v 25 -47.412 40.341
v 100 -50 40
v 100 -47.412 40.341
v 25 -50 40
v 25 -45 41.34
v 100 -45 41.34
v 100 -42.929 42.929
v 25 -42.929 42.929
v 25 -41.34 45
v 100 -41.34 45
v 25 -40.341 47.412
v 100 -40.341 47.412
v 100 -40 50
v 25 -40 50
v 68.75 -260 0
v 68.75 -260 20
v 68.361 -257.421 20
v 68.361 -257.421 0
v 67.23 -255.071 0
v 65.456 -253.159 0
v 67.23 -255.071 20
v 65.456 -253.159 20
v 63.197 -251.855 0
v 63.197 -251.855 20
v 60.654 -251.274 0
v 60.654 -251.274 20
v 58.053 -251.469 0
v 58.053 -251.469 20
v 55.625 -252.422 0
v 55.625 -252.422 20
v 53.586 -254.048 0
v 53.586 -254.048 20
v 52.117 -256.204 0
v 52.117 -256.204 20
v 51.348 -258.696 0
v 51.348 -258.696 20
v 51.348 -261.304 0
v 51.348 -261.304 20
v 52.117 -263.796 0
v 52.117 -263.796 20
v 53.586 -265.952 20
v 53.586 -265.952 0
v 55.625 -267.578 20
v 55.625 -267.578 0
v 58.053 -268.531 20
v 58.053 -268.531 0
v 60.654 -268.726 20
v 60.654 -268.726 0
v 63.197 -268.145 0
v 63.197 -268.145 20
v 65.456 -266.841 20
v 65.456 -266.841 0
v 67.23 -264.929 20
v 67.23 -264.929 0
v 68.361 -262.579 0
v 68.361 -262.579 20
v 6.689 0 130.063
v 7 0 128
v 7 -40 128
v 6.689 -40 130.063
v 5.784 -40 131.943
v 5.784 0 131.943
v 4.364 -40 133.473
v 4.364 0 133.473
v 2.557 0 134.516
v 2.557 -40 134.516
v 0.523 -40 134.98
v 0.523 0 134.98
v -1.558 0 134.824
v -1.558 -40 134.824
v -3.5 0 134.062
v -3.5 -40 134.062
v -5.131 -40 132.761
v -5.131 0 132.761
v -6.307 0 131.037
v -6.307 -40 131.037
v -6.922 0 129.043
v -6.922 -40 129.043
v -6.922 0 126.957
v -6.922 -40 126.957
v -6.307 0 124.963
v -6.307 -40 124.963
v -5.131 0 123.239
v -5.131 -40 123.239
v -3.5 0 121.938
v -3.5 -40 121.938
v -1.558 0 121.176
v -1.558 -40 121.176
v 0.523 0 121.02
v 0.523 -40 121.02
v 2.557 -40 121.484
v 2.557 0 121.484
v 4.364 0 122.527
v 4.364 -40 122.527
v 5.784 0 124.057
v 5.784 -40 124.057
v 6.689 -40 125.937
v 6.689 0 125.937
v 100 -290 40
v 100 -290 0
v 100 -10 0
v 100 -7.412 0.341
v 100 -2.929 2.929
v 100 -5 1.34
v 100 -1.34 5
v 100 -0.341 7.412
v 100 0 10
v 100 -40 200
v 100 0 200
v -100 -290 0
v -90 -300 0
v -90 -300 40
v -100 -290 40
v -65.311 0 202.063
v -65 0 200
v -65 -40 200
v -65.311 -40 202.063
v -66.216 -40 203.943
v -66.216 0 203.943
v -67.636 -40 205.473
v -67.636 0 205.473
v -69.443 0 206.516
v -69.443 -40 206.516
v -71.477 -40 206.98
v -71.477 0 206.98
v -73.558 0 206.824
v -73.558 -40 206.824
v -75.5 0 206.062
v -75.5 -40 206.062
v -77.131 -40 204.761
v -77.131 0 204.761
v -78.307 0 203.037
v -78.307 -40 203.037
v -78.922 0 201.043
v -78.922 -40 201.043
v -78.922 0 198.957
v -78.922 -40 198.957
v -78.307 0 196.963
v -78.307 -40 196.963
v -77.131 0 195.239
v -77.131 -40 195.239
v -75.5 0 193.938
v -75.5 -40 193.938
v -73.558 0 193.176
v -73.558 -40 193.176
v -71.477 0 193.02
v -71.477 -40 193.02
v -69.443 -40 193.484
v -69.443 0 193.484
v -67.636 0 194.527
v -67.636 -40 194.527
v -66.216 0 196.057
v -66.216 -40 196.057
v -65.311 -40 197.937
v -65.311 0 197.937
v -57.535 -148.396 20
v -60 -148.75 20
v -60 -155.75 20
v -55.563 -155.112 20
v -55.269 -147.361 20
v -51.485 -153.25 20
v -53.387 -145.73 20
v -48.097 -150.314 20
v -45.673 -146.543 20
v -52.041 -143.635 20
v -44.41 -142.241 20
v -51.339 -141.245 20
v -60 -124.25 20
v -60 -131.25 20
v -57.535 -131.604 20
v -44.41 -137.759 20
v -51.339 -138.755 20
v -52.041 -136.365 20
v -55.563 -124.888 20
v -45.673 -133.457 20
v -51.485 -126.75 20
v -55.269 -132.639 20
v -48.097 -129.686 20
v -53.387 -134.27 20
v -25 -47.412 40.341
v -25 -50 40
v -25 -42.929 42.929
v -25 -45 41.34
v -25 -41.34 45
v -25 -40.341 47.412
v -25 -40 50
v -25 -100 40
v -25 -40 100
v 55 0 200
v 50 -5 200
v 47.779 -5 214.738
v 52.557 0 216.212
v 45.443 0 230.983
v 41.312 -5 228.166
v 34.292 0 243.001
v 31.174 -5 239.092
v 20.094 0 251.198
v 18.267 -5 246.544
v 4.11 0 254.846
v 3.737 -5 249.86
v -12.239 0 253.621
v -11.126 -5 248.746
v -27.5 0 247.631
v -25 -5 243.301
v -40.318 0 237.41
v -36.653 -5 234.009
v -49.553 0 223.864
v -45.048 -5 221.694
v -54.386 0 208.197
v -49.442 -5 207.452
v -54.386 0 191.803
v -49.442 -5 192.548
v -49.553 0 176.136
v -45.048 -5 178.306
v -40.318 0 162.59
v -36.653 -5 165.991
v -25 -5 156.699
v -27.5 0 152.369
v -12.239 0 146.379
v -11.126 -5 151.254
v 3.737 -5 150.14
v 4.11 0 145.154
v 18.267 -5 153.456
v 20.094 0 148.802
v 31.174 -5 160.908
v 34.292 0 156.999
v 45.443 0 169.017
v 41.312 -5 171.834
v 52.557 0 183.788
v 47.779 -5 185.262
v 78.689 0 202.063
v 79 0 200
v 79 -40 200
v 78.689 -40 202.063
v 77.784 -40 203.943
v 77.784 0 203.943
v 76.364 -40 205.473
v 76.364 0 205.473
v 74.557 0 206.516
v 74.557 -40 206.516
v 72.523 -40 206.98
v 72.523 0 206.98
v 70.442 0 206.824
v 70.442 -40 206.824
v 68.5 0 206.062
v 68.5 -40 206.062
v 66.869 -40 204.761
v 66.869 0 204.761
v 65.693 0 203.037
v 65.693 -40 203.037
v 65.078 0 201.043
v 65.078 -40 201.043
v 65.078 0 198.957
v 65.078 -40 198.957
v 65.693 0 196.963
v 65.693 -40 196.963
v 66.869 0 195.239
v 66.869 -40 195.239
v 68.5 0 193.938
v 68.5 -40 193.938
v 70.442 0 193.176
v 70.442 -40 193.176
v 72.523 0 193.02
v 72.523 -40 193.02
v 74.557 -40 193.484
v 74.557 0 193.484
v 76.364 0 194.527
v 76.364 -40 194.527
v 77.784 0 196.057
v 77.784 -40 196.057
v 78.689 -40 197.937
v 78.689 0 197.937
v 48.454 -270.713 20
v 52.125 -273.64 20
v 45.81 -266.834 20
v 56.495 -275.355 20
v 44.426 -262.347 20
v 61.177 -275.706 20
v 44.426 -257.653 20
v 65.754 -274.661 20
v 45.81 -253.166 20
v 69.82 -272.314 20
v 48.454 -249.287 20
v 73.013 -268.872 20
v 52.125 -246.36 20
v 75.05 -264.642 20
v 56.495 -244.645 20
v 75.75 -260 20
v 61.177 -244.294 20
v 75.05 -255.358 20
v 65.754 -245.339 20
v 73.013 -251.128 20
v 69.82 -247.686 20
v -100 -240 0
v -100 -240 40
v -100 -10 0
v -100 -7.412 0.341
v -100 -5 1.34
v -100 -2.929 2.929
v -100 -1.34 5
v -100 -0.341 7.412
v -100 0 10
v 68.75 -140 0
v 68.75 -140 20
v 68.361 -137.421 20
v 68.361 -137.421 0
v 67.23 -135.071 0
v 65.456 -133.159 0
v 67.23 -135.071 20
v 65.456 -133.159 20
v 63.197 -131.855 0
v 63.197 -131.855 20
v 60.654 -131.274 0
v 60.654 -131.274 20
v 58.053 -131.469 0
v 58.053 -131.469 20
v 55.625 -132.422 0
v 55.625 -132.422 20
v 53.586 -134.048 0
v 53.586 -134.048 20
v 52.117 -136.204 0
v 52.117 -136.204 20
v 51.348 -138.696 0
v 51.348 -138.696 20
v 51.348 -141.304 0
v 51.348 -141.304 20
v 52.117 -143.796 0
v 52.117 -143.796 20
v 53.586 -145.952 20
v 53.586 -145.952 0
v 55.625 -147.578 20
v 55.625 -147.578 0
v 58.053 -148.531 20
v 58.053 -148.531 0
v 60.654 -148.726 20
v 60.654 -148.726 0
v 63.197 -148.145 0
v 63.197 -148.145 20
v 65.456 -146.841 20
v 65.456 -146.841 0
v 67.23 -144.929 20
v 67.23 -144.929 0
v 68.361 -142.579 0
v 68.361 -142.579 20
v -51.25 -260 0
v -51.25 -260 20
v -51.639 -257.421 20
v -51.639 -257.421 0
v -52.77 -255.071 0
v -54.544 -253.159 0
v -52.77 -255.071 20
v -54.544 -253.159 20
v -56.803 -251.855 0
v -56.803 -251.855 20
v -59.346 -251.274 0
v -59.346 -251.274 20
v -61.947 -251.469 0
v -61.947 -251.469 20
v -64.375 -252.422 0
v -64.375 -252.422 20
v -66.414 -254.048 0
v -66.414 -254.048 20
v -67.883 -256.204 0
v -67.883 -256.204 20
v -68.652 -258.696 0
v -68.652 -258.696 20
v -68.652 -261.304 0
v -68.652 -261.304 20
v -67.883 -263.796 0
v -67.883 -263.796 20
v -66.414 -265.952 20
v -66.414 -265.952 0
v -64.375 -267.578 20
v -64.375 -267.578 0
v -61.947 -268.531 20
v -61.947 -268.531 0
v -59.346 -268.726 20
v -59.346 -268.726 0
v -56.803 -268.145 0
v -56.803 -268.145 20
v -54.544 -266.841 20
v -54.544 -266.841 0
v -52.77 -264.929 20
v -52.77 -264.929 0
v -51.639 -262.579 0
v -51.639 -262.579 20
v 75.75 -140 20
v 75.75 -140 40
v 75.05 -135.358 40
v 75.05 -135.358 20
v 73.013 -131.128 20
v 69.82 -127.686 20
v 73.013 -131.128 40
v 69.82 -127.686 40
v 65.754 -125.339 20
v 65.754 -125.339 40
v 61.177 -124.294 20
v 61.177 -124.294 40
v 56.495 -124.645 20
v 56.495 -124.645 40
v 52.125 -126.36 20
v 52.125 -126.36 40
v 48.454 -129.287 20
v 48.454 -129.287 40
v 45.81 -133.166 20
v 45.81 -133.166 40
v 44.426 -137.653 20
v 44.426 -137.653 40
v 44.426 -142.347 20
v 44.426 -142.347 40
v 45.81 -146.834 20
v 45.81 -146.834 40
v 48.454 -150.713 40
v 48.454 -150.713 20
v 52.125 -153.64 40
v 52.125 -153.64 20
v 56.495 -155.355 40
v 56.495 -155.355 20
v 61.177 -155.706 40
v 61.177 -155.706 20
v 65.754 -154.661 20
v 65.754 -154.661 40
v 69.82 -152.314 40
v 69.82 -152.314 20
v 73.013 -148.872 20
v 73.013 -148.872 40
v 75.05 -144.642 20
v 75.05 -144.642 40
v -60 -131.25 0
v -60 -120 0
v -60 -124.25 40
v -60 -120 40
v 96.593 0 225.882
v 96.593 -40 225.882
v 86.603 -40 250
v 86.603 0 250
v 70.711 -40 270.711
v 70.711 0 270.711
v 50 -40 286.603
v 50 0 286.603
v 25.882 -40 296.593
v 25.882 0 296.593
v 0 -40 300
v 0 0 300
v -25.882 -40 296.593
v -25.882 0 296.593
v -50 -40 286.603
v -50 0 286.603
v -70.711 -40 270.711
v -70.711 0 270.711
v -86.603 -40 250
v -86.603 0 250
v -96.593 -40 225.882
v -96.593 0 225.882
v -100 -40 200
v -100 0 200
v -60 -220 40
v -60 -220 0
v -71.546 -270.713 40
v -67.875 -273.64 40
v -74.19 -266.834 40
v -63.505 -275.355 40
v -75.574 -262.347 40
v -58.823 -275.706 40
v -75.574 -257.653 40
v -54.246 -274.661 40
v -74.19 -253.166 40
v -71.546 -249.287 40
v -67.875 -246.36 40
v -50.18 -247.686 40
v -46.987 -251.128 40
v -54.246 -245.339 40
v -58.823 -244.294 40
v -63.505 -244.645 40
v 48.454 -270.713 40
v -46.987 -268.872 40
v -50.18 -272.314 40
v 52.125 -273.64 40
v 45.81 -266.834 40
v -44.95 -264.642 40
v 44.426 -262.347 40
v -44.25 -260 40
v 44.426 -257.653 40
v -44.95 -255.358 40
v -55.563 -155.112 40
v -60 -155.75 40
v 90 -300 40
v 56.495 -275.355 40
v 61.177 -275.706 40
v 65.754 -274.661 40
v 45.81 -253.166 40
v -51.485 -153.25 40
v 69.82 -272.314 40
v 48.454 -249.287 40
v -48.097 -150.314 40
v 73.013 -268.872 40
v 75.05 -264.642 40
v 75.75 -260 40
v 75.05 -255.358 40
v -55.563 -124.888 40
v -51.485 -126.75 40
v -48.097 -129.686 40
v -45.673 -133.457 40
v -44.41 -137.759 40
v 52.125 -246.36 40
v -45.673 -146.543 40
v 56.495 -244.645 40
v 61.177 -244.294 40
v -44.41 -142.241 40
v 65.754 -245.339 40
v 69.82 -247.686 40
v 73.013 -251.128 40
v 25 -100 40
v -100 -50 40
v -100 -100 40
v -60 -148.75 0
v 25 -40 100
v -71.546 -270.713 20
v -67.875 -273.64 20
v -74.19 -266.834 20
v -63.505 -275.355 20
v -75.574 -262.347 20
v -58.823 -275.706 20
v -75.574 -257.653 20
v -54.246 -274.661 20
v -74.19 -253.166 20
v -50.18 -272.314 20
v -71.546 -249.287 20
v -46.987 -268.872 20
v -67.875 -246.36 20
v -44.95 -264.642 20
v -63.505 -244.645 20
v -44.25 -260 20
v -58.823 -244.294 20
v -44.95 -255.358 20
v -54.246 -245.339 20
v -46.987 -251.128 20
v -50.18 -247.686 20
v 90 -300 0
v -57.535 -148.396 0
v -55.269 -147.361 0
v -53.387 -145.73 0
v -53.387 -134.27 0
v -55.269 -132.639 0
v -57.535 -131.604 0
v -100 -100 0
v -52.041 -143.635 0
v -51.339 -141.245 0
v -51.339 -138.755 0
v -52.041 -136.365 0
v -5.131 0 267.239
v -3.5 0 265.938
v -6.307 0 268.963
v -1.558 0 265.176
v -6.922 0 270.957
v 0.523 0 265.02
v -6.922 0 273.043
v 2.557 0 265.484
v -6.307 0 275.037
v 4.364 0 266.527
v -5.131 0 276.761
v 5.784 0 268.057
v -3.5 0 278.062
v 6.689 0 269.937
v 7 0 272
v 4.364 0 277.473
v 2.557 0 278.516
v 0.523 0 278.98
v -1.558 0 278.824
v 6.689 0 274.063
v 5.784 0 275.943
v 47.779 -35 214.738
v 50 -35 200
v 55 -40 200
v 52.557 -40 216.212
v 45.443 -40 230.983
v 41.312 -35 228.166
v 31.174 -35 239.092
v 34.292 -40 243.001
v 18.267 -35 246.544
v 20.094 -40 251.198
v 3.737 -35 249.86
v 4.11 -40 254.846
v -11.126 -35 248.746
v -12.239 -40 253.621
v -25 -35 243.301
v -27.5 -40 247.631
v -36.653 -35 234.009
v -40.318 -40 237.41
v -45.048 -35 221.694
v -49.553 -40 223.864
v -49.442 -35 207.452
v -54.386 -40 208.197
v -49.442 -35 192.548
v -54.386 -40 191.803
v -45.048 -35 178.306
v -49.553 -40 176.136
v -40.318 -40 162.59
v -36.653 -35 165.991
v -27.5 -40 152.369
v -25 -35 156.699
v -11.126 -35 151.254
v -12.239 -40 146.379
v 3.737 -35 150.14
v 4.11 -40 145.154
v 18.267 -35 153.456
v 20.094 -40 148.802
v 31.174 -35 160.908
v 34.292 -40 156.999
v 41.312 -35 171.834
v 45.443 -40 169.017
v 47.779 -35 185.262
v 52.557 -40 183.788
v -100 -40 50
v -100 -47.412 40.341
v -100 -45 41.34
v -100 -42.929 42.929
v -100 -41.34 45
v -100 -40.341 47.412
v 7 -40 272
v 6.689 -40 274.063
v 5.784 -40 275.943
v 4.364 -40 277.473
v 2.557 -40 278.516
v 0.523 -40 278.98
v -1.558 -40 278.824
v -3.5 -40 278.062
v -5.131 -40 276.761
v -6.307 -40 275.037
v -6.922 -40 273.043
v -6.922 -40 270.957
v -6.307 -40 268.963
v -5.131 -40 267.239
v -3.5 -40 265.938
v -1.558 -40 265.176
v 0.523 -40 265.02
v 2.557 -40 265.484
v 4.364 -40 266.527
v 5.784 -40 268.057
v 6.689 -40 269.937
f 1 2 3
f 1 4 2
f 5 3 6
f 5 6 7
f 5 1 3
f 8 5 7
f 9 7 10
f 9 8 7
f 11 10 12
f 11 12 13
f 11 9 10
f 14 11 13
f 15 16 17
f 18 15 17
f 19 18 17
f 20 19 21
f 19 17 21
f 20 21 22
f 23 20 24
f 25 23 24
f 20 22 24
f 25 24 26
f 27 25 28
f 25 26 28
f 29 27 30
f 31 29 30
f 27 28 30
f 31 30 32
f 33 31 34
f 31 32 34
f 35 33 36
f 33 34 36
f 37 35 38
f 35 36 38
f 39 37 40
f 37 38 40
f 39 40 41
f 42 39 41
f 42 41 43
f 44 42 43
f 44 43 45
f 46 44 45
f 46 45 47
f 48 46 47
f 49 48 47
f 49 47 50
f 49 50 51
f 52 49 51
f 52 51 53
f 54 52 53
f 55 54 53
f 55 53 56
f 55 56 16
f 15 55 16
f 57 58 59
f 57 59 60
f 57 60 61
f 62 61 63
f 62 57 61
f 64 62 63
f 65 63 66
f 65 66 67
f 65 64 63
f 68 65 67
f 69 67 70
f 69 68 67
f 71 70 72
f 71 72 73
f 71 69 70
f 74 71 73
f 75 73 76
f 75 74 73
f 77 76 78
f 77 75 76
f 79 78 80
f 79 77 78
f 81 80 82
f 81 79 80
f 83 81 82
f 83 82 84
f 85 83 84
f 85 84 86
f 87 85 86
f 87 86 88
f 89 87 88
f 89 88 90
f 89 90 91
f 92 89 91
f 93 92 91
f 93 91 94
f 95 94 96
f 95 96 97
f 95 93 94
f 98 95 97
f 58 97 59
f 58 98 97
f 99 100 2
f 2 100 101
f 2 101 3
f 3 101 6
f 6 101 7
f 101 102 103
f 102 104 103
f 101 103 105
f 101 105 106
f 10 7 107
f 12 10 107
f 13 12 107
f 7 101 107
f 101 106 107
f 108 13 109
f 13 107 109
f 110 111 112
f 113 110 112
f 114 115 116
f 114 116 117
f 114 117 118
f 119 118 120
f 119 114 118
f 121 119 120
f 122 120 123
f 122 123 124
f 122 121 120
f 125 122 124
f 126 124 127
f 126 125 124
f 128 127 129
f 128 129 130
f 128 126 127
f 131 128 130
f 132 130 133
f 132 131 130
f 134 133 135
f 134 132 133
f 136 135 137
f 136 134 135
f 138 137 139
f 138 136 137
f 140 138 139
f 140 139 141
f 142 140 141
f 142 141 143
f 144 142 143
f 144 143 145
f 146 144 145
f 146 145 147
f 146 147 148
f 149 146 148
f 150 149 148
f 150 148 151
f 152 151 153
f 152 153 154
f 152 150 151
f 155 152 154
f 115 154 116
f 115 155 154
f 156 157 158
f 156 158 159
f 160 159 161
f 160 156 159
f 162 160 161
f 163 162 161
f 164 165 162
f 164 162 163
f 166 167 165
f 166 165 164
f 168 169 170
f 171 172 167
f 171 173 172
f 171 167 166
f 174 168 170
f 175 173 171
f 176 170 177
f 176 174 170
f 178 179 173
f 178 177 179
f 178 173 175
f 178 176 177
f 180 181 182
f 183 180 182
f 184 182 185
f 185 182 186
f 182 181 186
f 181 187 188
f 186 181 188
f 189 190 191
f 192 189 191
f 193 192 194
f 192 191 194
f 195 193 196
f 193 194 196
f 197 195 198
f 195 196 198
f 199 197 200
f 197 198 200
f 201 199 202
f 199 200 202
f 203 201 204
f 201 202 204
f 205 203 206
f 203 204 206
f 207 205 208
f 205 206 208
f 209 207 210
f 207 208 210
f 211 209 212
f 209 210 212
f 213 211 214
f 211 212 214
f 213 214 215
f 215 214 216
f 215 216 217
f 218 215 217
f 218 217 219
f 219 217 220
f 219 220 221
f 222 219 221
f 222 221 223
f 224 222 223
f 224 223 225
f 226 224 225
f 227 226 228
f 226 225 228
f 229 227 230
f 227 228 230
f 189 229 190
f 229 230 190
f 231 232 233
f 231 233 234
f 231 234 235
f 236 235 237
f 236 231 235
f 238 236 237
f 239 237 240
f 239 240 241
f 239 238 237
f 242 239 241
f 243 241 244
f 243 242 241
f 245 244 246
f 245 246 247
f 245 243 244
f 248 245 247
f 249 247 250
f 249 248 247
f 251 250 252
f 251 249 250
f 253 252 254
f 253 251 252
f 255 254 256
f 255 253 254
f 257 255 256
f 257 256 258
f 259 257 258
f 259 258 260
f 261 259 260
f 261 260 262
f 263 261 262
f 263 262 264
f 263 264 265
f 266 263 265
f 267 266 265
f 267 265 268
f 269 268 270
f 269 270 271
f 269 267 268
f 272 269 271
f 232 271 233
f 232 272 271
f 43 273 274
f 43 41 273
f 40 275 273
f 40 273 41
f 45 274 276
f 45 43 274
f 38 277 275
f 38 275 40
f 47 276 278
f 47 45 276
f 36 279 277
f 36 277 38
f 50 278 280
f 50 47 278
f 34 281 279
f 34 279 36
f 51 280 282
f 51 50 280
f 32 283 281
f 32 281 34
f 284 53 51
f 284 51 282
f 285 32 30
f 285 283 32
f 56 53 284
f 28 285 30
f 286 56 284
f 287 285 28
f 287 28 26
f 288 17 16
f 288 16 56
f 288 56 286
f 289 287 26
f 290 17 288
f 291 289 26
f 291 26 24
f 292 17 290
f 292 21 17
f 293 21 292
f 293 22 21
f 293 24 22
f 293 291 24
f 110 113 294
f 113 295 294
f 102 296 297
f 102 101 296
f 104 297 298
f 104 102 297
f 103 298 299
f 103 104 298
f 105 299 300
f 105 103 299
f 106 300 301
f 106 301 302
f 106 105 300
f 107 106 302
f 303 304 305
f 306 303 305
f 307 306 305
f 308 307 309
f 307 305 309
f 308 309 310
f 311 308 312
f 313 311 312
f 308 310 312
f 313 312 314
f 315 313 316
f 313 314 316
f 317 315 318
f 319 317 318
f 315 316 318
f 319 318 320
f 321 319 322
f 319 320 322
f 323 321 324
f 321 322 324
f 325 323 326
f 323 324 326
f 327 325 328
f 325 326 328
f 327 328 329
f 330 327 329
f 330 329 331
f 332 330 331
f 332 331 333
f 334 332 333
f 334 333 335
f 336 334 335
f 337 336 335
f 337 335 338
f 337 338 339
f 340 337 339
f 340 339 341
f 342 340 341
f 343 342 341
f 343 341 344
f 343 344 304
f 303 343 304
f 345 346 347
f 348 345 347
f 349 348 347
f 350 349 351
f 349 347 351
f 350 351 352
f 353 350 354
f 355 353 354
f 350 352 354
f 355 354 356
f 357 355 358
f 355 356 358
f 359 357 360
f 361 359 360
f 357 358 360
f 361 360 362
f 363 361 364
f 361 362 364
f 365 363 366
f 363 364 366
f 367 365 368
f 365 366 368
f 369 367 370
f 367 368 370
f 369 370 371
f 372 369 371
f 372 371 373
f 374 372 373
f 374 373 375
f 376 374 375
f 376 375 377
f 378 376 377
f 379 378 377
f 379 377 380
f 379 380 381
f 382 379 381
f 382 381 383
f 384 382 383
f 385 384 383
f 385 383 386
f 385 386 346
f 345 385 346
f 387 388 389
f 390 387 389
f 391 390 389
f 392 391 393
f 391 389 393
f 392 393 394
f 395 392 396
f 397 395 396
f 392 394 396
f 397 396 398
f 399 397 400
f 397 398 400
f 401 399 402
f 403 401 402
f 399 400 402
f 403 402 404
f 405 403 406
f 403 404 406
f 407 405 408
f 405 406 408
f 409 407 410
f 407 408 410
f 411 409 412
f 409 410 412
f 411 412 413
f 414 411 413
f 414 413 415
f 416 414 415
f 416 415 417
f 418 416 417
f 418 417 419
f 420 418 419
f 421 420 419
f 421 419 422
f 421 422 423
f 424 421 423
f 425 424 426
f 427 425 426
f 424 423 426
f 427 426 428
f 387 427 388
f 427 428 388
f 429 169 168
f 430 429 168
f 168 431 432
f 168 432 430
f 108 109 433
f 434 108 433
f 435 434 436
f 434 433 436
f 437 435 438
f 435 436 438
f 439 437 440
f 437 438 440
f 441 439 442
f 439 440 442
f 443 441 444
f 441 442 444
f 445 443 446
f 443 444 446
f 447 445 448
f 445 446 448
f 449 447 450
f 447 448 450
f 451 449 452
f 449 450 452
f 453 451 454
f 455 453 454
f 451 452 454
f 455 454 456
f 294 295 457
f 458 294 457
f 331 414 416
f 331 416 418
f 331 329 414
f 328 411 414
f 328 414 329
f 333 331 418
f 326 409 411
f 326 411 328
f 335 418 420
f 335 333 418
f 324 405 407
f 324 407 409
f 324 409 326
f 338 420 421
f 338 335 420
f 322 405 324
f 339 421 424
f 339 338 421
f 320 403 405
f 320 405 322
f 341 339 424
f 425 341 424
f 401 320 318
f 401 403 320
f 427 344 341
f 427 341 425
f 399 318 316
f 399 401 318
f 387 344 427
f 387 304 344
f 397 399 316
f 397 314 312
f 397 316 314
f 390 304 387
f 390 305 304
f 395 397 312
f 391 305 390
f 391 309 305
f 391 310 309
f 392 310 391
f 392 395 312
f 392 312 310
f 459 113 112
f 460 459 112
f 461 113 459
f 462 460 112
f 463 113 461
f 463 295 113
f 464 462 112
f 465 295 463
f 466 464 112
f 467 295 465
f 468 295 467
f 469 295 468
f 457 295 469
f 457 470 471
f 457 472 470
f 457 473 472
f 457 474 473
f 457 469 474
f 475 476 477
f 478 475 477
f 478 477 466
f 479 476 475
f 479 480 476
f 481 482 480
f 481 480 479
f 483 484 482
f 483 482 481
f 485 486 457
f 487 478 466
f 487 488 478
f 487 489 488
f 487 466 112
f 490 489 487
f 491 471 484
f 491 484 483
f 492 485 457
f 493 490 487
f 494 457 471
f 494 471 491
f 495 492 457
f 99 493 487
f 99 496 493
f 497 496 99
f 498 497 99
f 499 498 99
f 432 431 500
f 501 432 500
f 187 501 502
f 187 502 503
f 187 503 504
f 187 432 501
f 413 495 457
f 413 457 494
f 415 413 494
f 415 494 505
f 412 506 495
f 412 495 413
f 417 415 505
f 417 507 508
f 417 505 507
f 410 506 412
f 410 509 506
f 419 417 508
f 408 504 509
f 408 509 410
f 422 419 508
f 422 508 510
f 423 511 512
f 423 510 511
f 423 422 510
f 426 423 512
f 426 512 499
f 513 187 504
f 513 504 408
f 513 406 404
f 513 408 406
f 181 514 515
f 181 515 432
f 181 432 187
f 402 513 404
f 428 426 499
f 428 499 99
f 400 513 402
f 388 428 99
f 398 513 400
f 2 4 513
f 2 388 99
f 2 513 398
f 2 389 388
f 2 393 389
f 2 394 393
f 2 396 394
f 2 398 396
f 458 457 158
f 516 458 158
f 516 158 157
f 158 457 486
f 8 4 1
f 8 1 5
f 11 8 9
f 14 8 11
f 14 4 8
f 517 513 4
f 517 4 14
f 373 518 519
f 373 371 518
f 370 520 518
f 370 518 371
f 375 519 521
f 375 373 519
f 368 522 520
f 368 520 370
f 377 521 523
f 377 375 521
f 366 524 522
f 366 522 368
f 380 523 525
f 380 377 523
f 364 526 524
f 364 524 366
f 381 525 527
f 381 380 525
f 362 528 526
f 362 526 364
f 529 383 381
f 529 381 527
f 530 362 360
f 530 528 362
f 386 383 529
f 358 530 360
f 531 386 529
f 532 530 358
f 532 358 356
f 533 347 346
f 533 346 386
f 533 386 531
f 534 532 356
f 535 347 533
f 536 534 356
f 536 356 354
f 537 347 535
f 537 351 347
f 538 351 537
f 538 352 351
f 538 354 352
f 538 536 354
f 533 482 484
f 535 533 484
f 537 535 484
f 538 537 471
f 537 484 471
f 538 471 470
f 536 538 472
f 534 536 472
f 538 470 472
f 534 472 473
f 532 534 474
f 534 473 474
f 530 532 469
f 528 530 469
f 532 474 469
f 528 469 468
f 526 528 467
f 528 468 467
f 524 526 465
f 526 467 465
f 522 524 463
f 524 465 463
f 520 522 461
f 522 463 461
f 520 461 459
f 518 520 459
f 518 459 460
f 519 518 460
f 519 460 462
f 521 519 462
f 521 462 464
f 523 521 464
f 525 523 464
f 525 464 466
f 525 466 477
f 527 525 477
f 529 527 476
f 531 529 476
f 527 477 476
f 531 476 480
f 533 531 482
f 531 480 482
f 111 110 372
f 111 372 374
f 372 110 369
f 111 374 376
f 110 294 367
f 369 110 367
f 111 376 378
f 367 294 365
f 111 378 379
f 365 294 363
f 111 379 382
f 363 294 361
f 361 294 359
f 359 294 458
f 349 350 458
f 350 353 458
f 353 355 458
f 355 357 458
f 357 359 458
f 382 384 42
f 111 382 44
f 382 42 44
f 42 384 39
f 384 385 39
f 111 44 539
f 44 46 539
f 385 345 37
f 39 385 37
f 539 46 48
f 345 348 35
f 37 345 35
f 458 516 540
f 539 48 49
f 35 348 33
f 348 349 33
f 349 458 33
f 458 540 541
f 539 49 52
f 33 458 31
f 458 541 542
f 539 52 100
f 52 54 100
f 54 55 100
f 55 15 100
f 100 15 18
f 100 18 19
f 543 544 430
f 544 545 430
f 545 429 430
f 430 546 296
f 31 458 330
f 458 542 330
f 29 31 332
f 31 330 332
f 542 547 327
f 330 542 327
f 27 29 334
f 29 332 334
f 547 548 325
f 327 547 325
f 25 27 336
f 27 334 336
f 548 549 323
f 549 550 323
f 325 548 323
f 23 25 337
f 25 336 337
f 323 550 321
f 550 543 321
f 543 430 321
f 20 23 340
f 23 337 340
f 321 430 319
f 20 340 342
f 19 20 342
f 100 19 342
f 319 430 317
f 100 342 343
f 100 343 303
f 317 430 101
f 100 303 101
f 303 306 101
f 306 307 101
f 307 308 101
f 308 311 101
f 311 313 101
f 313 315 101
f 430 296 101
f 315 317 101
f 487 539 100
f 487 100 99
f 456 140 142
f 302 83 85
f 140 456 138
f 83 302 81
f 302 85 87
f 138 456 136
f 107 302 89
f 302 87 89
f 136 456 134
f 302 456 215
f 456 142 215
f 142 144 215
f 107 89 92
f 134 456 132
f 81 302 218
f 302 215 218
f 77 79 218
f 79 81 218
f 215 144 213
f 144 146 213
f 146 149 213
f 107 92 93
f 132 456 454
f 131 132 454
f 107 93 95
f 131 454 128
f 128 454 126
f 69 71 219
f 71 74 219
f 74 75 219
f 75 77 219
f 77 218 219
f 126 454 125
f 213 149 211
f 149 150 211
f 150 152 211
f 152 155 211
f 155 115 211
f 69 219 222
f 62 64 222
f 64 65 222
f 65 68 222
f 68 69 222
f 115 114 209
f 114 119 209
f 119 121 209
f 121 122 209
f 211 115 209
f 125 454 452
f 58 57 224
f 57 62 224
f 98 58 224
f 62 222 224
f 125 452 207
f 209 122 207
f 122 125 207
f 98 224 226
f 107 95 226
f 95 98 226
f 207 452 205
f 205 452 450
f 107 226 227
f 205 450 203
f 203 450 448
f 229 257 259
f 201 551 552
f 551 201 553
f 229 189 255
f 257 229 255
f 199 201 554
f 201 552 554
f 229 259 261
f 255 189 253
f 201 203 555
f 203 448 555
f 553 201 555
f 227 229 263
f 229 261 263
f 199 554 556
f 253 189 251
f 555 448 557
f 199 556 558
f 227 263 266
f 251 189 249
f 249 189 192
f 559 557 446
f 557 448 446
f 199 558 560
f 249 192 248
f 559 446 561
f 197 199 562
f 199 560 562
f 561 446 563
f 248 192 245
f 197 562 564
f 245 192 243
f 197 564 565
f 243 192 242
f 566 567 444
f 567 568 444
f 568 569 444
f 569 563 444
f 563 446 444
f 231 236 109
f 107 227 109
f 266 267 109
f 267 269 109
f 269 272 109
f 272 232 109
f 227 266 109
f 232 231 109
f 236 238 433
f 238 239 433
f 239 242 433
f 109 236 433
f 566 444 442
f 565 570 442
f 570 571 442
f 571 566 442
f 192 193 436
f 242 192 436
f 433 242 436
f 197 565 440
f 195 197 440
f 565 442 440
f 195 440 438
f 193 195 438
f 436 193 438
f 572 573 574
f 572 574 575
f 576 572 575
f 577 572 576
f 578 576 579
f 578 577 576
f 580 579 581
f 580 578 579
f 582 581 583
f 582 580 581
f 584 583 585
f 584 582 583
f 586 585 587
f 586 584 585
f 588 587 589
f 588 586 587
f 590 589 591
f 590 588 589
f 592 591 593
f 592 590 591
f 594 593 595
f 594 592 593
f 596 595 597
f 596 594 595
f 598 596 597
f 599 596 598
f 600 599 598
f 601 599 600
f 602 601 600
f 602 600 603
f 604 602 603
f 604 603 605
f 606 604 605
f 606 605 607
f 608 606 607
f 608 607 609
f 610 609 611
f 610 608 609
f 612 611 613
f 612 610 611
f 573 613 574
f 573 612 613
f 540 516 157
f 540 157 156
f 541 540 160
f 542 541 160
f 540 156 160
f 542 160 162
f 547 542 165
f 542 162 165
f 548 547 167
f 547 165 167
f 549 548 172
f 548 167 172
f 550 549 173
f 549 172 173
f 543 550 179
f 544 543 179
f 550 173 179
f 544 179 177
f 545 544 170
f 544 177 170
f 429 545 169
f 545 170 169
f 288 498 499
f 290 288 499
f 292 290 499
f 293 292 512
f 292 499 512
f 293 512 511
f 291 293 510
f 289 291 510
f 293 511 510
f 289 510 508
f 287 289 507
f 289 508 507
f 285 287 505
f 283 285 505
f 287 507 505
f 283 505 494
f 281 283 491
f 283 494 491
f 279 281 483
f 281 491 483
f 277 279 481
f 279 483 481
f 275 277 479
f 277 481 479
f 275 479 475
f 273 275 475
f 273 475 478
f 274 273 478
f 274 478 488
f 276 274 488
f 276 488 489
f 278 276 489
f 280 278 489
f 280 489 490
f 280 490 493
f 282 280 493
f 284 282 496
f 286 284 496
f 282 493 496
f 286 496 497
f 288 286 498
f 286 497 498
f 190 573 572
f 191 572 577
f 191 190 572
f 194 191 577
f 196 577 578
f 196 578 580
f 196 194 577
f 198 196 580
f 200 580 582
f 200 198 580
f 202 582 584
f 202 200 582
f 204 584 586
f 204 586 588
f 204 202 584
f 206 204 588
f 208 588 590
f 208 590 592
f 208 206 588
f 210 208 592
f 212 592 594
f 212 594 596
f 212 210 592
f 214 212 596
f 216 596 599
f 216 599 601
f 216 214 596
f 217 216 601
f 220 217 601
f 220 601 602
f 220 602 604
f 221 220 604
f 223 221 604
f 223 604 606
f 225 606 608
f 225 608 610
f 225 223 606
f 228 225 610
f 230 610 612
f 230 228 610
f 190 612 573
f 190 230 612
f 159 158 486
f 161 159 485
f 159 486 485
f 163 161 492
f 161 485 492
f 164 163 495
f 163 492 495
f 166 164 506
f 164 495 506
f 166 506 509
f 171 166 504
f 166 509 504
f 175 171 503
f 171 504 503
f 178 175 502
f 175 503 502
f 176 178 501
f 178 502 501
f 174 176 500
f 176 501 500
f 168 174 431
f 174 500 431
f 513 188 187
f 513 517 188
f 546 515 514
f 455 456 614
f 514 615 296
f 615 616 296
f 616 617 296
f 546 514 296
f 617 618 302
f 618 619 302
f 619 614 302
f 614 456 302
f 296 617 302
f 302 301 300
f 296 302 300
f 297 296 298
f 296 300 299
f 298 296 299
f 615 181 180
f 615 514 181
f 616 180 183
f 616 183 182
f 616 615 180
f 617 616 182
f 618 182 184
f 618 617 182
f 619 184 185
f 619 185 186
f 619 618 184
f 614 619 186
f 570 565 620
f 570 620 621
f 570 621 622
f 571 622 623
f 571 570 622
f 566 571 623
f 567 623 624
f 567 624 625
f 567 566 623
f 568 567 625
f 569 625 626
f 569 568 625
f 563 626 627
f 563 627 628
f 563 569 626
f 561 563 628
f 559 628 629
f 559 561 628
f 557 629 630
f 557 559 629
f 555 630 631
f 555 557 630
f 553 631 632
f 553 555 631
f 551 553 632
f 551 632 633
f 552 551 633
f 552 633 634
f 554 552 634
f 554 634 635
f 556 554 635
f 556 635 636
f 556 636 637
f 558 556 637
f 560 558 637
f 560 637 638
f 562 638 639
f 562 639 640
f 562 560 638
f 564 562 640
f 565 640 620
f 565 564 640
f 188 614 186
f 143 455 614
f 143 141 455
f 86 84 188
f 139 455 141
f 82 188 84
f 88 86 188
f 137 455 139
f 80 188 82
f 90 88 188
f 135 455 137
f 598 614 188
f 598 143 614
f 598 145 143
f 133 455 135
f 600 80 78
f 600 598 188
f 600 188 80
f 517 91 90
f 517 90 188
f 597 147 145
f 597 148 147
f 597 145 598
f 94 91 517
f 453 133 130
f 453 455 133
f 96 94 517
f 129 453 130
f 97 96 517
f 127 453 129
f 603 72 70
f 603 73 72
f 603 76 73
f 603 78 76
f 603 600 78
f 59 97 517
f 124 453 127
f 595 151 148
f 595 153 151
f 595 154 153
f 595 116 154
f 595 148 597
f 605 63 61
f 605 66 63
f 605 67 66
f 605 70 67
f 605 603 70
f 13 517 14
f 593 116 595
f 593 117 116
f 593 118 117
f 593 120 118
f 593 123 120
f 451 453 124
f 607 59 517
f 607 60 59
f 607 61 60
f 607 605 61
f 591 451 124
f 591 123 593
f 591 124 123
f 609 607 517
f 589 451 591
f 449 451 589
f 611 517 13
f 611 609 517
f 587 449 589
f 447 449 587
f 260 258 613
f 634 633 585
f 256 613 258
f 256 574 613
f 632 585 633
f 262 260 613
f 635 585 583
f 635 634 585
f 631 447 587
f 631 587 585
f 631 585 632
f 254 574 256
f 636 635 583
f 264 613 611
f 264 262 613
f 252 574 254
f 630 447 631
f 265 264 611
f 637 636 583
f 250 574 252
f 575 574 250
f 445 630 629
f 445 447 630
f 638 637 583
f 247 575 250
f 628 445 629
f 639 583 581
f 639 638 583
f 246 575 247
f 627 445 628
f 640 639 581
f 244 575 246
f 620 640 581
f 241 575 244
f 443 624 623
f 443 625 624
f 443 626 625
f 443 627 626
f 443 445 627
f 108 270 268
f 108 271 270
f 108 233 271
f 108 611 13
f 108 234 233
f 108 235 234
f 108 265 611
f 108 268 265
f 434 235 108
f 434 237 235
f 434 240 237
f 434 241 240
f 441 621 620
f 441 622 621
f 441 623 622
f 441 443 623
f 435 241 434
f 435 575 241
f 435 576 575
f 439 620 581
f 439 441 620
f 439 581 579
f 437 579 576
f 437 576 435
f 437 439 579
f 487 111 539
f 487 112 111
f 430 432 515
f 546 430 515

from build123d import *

# Parameters (mm, degrees)
F0_W      = 200
F0_H      = 40
F0_R      = 7
F0_R_2    = 50
F1_DEPTH  = 40
F2_DEPTH  = 300
F3_SIZE   = 5
F4_R      = 8.75
F5_DEPTH  = 40.001
F4_R_2    = 15.75
F6_DEPTH  = 20
F7_SIZE   = 10
F8_R      = 10
F10_DEPTH = 25
F13_DEPTH = 40.001
F14_R     = 10


with BuildPart() as f1:
    # F0 (on Front) → F1 (new body)
    with BuildSketch(Plane.XZ):
        with Locations((0, 20)):
            Rectangle(F0_W, F0_H)
        with BuildLine():
            Line((-100, 200), (-100, 40))
            Line((-100, 40), (100, 40))
            Line((100, 40), (100, 200))
            ThreePointArc((100, 200), (0, 300), (-100, 200))
        make_face()
        with Locations((0, 128)):
            Circle(F0_R, mode=Mode.SUBTRACT)
        with Locations((-72, 200)):
            Circle(F0_R, mode=Mode.SUBTRACT)
        with Locations((0, 200)):
            Circle(F0_R_2, mode=Mode.SUBTRACT)
        with Locations((72, 200)):
            Circle(F0_R, mode=Mode.SUBTRACT)
        with Locations((0, 272)):
            Circle(F0_R, mode=Mode.SUBTRACT)
    extrude(amount=F1_DEPTH)

    # F0 (on Front) → F2 (join)
    with BuildSketch(Plane.XZ):
        with Locations((0, 20)):
            Rectangle(F0_W, F0_H)
    extrude(amount=F2_DEPTH)

    # F3
    f3_edges = [f1.edges().sort_by_distance(p)[0] for p in [
        (-50, -40, 200),
        (-50, 0, 200),
    ]]
    chamfer(f3_edges, length=F3_SIZE)

    # F4 (on face) → F5 (cut, through all)
    with BuildSketch(Plane.XY.offset(40)):
        with Locations((60, -140)):
            Circle(F4_R)
        with Locations((-60, -140)):
            Circle(F4_R)
        with Locations((60, -260)):
            Circle(F4_R)
        with Locations((-60, -260)):
            Circle(F4_R)
    extrude(amount=-F5_DEPTH, mode=Mode.SUBTRACT)

    # F4 (on face) → F6 (cut)
    with BuildSketch(Plane.XY.offset(40)):
        with Locations((-60, -140)):
            Circle(F4_R_2)
        with Locations((-60, -140)):
            Circle(F4_R, mode=Mode.SUBTRACT)
        with Locations((60, -140)):
            Circle(F4_R_2)
        with Locations((60, -140)):
            Circle(F4_R, mode=Mode.SUBTRACT)
        with Locations((60, -260)):
            Circle(F4_R_2)
        with Locations((60, -260)):
            Circle(F4_R, mode=Mode.SUBTRACT)
        with Locations((-60, -260)):
            Circle(F4_R_2)
        with Locations((-60, -260)):
            Circle(F4_R, mode=Mode.SUBTRACT)
    extrude(amount=-F6_DEPTH, mode=Mode.SUBTRACT)

    # F7
    f7_edges = [f1.edges().sort_by_distance(p)[0] for p in [
        (-100, -300, 20),
        (100, -300, 20),
    ]]
    chamfer(f7_edges, length=F7_SIZE)

    # F8
    f8_edges = [f1.edges().sort_by_distance(p)[0] for p in [
        (0, 0, 0),
    ]]
    fillet(f8_edges, radius=F8_R)

    # F9 (on Right) → F10 (join, symmetric)
    with BuildSketch(Plane.YZ):
        Polygon((-40, 100), (-100, 40), (-40, 40), align=None)
    extrude(amount=F10_DEPTH, both=True)

    # F12 (on offset) → F13 (cut, through all)
    with BuildSketch(Plane.XY.offset(40)):
        Polygon((-100, -100), (-100, -240), (-60, -220), (-60, -120), align=None)
    extrude(amount=-F13_DEPTH, mode=Mode.SUBTRACT)

    # F14
    f14_edges = [f1.edges().sort_by_distance(p)[0] for p in [
        (62.5, -40, 40),
        (-62.5, -40, 40),
    ]]
    fillet(f14_edges, radius=F14_R)


solid = f1.part
